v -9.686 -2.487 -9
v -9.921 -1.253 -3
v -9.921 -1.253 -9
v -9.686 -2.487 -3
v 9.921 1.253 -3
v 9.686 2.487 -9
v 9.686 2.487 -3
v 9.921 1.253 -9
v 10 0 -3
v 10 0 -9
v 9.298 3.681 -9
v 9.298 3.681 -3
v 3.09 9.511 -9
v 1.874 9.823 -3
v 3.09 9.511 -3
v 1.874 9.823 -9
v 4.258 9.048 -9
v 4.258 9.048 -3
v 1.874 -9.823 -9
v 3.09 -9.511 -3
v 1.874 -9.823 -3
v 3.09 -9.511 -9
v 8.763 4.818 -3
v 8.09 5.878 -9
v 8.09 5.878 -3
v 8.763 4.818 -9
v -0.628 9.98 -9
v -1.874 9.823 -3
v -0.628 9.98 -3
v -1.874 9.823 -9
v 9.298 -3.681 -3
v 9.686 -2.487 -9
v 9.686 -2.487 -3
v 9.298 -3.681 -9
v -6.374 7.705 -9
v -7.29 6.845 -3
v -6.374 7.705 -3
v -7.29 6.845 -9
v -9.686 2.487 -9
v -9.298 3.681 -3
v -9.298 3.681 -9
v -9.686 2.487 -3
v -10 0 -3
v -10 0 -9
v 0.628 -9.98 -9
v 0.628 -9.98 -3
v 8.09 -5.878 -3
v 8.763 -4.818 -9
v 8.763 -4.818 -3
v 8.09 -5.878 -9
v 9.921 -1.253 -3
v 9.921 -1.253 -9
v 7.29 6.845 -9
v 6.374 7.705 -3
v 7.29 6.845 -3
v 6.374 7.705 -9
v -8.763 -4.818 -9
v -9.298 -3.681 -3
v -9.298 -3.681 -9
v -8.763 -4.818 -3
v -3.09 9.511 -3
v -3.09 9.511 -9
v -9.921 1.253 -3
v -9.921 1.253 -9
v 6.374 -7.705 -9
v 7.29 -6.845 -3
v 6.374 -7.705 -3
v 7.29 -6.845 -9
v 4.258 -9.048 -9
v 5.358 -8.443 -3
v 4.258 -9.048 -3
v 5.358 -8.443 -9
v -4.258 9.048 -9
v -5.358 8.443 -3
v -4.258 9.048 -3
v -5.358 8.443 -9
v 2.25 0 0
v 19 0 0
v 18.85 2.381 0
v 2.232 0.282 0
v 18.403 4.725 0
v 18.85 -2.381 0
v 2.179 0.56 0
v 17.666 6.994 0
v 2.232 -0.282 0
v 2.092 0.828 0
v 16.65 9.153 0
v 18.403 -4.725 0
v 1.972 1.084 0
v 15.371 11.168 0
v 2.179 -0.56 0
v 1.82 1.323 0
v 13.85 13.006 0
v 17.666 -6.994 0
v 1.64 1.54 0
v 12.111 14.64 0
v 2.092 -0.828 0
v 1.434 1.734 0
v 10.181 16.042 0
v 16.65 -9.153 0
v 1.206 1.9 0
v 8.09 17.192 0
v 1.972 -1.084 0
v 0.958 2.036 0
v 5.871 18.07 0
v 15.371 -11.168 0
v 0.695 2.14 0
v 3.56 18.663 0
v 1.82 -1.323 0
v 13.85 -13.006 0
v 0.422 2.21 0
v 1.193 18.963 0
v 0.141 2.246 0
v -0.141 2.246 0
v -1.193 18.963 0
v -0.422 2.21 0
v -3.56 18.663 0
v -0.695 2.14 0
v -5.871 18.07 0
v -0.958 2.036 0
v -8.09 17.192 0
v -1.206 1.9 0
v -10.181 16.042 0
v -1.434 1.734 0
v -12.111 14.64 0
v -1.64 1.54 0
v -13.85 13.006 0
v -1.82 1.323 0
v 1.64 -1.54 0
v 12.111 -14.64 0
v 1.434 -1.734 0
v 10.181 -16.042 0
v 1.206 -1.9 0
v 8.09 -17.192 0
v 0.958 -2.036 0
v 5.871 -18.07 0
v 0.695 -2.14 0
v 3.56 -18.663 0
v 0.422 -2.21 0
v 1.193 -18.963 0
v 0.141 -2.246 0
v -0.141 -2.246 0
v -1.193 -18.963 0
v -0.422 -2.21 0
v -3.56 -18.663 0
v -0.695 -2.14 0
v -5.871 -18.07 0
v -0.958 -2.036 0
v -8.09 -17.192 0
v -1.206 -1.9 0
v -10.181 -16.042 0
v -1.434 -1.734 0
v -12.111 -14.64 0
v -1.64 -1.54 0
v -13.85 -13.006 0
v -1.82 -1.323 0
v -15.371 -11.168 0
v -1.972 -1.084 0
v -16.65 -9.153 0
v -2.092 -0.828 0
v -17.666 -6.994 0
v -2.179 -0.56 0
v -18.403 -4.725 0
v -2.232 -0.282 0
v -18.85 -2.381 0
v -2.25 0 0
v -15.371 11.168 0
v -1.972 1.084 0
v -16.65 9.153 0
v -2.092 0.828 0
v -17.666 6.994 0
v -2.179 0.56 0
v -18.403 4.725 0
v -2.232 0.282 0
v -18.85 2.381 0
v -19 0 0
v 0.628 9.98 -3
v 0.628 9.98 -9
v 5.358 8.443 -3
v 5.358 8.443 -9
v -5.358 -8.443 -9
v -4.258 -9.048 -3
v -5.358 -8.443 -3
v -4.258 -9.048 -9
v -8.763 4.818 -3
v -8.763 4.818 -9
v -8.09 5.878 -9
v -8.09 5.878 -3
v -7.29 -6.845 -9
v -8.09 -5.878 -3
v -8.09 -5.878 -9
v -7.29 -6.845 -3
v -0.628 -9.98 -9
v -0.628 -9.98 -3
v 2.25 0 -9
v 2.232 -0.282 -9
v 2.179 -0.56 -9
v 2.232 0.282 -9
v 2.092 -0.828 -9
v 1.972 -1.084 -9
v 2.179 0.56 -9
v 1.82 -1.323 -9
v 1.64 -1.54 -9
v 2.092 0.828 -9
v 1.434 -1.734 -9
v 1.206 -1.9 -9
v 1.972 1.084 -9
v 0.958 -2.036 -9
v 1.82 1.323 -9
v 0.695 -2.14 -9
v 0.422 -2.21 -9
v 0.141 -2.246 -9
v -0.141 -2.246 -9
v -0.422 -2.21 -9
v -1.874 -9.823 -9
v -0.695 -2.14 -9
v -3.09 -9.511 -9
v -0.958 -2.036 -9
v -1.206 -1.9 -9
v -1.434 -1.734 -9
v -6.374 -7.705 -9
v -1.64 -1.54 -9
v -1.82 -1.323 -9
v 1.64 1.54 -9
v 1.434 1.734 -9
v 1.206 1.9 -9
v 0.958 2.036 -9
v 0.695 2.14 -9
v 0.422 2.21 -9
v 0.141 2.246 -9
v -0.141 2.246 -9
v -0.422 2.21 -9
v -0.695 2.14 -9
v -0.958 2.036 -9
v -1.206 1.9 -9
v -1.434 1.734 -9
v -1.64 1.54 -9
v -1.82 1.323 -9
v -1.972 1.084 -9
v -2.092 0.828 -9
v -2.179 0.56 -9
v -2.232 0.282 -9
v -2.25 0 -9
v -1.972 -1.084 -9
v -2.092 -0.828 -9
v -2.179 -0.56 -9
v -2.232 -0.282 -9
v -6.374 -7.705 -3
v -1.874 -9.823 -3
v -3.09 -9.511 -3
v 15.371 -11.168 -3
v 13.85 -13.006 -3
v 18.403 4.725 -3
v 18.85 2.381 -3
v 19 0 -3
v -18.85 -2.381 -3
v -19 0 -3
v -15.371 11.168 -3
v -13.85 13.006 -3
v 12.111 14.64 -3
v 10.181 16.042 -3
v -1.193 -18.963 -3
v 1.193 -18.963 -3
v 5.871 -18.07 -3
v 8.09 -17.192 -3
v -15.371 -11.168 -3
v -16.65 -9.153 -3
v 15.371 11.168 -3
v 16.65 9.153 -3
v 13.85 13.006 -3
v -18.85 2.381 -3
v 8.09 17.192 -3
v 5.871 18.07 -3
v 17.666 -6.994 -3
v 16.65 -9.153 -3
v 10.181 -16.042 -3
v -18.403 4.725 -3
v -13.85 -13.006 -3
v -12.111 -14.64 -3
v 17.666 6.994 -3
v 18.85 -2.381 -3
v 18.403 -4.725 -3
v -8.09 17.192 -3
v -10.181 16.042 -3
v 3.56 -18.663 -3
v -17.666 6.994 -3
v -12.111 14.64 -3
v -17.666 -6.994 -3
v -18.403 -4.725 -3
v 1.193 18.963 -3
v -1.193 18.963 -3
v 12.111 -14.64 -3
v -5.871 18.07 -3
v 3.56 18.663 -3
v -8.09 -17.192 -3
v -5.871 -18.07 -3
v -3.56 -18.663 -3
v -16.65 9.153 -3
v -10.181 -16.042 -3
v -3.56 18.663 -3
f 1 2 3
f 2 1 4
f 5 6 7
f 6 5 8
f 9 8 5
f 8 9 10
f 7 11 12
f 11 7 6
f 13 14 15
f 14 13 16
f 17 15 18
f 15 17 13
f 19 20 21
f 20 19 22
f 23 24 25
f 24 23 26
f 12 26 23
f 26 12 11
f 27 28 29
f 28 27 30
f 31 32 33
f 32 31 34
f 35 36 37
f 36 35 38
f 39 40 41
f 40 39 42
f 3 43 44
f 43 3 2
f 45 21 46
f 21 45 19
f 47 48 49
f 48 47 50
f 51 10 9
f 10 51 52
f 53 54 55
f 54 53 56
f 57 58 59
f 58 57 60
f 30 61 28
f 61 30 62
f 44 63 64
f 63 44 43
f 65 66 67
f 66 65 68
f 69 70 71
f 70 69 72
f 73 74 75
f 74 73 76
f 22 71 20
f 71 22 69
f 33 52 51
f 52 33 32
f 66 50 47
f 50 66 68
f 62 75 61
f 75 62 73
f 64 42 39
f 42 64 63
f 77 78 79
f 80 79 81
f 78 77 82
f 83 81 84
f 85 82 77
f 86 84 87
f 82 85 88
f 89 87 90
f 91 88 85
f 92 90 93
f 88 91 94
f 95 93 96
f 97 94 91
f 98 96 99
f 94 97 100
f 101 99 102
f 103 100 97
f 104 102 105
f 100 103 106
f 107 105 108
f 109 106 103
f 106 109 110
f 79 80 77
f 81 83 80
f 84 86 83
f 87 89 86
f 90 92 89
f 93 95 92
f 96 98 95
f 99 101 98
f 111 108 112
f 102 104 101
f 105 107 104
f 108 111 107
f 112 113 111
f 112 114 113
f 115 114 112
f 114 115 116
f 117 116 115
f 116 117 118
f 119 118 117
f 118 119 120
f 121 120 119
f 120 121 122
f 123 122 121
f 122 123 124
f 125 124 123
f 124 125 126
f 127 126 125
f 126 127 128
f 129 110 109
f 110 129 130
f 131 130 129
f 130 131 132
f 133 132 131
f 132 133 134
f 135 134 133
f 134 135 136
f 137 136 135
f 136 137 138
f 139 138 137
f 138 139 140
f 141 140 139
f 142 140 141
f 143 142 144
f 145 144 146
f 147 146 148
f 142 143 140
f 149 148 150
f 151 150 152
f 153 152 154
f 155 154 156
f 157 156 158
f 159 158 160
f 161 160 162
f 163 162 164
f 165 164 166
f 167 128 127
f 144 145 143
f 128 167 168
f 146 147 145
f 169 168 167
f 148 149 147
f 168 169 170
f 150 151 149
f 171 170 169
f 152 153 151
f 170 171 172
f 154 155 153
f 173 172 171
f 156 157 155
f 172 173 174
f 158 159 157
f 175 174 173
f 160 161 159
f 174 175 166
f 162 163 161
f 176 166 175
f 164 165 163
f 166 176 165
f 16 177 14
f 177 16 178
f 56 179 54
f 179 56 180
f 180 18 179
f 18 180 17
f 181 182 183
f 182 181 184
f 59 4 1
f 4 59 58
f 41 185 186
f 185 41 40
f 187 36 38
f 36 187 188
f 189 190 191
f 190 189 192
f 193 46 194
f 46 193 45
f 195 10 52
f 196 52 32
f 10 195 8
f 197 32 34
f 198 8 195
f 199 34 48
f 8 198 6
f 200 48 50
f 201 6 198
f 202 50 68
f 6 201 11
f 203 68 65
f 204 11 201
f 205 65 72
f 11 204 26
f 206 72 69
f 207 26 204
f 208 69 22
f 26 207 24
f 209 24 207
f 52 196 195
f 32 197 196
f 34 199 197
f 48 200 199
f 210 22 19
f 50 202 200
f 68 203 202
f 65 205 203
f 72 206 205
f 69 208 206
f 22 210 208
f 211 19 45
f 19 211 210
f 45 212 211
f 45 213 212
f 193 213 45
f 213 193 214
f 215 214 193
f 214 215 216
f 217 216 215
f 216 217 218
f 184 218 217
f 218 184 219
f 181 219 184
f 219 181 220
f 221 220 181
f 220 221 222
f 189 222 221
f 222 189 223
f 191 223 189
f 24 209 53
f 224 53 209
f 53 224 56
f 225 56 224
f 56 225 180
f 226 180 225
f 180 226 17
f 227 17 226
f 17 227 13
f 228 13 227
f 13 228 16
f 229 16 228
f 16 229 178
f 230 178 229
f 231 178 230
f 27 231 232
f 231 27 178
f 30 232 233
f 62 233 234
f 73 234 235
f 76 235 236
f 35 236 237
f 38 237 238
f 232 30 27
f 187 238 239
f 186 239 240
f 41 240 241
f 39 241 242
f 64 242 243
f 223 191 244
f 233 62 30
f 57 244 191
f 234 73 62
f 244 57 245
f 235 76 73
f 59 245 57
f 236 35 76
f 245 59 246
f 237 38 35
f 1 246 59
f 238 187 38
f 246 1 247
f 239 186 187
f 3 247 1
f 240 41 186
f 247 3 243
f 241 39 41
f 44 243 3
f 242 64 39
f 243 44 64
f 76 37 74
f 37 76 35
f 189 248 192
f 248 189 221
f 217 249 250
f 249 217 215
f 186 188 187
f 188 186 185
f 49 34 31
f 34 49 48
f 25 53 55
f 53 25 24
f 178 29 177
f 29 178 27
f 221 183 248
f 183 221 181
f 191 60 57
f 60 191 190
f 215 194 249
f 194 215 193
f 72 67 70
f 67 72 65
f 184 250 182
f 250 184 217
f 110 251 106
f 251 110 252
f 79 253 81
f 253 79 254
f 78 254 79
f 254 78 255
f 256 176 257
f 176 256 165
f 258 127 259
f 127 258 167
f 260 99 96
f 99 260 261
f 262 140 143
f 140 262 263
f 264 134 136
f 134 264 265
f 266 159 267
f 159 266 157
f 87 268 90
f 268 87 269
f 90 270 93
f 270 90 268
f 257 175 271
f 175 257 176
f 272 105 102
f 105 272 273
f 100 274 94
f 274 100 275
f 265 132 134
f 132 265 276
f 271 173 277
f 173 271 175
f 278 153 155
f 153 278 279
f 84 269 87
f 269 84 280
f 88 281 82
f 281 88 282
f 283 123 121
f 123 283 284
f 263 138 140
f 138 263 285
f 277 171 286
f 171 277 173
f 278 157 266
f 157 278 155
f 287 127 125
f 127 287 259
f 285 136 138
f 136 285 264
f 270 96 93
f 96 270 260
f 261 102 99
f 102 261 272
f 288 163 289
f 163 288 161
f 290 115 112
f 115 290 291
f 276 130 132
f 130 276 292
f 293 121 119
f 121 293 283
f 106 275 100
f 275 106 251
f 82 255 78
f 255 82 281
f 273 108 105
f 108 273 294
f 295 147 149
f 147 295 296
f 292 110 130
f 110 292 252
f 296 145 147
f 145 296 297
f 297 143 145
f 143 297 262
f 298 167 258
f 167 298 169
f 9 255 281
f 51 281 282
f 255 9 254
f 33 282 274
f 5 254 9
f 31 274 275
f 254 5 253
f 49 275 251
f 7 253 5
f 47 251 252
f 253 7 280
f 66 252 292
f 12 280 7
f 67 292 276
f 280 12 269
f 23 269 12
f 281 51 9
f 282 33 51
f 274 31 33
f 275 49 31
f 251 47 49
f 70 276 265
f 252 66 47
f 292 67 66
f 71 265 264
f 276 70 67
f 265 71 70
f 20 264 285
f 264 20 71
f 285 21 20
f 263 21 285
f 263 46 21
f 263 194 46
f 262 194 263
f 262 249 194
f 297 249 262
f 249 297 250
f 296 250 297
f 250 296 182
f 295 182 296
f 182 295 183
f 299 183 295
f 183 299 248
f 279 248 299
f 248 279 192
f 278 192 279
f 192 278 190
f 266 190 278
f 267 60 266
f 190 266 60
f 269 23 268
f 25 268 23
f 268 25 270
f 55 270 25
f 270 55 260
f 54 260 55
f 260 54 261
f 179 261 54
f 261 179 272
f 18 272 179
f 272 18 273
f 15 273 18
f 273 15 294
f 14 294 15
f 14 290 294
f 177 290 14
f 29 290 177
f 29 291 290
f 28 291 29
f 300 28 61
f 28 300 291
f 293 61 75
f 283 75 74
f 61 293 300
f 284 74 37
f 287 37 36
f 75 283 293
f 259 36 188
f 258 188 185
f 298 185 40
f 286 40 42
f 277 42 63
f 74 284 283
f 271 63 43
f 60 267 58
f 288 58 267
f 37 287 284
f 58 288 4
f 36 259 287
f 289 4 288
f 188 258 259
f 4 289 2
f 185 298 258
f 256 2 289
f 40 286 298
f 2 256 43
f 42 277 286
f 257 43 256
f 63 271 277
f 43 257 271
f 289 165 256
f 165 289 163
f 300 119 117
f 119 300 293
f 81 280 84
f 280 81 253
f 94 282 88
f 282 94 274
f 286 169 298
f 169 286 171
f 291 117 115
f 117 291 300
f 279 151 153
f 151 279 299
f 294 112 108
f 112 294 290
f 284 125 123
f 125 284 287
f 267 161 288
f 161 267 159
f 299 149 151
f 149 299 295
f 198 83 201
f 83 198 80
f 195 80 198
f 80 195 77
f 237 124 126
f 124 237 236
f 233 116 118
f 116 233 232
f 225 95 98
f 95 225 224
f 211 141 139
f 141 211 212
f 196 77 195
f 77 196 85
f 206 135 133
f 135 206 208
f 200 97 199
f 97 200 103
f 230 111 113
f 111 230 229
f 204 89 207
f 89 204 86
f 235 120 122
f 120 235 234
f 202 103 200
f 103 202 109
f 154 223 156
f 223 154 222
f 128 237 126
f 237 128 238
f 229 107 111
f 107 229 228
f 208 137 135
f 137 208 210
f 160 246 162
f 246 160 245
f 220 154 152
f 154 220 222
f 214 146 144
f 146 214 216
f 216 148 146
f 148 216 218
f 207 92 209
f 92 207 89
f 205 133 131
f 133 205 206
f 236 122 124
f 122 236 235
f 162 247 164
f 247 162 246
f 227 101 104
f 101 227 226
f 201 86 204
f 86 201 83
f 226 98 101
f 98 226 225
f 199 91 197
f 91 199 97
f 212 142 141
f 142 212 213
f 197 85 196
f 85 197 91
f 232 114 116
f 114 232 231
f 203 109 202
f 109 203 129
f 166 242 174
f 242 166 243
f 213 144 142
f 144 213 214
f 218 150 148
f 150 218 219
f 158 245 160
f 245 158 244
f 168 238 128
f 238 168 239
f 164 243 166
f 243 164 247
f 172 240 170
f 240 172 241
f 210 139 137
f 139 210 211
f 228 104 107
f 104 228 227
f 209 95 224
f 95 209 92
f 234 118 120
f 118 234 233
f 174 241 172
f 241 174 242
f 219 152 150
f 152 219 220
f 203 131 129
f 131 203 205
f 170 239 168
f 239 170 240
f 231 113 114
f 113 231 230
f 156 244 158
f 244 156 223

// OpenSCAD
$fn = 50;


difference() {
	union() {
		translate(v = [0, 0, -9.0000000000]) {
			cylinder(h = 9, r = 10.0000000000);
		}
		translate(v = [0, 0, -3.0000000000]) {
			cylinder(h = 3, r = 19.0000000000);
		}
	}
	union() {
		#translate(v = [0, 0, -9]) {
			cylinder(h = 9, r = 2.2500000000);
		}
	}
}
